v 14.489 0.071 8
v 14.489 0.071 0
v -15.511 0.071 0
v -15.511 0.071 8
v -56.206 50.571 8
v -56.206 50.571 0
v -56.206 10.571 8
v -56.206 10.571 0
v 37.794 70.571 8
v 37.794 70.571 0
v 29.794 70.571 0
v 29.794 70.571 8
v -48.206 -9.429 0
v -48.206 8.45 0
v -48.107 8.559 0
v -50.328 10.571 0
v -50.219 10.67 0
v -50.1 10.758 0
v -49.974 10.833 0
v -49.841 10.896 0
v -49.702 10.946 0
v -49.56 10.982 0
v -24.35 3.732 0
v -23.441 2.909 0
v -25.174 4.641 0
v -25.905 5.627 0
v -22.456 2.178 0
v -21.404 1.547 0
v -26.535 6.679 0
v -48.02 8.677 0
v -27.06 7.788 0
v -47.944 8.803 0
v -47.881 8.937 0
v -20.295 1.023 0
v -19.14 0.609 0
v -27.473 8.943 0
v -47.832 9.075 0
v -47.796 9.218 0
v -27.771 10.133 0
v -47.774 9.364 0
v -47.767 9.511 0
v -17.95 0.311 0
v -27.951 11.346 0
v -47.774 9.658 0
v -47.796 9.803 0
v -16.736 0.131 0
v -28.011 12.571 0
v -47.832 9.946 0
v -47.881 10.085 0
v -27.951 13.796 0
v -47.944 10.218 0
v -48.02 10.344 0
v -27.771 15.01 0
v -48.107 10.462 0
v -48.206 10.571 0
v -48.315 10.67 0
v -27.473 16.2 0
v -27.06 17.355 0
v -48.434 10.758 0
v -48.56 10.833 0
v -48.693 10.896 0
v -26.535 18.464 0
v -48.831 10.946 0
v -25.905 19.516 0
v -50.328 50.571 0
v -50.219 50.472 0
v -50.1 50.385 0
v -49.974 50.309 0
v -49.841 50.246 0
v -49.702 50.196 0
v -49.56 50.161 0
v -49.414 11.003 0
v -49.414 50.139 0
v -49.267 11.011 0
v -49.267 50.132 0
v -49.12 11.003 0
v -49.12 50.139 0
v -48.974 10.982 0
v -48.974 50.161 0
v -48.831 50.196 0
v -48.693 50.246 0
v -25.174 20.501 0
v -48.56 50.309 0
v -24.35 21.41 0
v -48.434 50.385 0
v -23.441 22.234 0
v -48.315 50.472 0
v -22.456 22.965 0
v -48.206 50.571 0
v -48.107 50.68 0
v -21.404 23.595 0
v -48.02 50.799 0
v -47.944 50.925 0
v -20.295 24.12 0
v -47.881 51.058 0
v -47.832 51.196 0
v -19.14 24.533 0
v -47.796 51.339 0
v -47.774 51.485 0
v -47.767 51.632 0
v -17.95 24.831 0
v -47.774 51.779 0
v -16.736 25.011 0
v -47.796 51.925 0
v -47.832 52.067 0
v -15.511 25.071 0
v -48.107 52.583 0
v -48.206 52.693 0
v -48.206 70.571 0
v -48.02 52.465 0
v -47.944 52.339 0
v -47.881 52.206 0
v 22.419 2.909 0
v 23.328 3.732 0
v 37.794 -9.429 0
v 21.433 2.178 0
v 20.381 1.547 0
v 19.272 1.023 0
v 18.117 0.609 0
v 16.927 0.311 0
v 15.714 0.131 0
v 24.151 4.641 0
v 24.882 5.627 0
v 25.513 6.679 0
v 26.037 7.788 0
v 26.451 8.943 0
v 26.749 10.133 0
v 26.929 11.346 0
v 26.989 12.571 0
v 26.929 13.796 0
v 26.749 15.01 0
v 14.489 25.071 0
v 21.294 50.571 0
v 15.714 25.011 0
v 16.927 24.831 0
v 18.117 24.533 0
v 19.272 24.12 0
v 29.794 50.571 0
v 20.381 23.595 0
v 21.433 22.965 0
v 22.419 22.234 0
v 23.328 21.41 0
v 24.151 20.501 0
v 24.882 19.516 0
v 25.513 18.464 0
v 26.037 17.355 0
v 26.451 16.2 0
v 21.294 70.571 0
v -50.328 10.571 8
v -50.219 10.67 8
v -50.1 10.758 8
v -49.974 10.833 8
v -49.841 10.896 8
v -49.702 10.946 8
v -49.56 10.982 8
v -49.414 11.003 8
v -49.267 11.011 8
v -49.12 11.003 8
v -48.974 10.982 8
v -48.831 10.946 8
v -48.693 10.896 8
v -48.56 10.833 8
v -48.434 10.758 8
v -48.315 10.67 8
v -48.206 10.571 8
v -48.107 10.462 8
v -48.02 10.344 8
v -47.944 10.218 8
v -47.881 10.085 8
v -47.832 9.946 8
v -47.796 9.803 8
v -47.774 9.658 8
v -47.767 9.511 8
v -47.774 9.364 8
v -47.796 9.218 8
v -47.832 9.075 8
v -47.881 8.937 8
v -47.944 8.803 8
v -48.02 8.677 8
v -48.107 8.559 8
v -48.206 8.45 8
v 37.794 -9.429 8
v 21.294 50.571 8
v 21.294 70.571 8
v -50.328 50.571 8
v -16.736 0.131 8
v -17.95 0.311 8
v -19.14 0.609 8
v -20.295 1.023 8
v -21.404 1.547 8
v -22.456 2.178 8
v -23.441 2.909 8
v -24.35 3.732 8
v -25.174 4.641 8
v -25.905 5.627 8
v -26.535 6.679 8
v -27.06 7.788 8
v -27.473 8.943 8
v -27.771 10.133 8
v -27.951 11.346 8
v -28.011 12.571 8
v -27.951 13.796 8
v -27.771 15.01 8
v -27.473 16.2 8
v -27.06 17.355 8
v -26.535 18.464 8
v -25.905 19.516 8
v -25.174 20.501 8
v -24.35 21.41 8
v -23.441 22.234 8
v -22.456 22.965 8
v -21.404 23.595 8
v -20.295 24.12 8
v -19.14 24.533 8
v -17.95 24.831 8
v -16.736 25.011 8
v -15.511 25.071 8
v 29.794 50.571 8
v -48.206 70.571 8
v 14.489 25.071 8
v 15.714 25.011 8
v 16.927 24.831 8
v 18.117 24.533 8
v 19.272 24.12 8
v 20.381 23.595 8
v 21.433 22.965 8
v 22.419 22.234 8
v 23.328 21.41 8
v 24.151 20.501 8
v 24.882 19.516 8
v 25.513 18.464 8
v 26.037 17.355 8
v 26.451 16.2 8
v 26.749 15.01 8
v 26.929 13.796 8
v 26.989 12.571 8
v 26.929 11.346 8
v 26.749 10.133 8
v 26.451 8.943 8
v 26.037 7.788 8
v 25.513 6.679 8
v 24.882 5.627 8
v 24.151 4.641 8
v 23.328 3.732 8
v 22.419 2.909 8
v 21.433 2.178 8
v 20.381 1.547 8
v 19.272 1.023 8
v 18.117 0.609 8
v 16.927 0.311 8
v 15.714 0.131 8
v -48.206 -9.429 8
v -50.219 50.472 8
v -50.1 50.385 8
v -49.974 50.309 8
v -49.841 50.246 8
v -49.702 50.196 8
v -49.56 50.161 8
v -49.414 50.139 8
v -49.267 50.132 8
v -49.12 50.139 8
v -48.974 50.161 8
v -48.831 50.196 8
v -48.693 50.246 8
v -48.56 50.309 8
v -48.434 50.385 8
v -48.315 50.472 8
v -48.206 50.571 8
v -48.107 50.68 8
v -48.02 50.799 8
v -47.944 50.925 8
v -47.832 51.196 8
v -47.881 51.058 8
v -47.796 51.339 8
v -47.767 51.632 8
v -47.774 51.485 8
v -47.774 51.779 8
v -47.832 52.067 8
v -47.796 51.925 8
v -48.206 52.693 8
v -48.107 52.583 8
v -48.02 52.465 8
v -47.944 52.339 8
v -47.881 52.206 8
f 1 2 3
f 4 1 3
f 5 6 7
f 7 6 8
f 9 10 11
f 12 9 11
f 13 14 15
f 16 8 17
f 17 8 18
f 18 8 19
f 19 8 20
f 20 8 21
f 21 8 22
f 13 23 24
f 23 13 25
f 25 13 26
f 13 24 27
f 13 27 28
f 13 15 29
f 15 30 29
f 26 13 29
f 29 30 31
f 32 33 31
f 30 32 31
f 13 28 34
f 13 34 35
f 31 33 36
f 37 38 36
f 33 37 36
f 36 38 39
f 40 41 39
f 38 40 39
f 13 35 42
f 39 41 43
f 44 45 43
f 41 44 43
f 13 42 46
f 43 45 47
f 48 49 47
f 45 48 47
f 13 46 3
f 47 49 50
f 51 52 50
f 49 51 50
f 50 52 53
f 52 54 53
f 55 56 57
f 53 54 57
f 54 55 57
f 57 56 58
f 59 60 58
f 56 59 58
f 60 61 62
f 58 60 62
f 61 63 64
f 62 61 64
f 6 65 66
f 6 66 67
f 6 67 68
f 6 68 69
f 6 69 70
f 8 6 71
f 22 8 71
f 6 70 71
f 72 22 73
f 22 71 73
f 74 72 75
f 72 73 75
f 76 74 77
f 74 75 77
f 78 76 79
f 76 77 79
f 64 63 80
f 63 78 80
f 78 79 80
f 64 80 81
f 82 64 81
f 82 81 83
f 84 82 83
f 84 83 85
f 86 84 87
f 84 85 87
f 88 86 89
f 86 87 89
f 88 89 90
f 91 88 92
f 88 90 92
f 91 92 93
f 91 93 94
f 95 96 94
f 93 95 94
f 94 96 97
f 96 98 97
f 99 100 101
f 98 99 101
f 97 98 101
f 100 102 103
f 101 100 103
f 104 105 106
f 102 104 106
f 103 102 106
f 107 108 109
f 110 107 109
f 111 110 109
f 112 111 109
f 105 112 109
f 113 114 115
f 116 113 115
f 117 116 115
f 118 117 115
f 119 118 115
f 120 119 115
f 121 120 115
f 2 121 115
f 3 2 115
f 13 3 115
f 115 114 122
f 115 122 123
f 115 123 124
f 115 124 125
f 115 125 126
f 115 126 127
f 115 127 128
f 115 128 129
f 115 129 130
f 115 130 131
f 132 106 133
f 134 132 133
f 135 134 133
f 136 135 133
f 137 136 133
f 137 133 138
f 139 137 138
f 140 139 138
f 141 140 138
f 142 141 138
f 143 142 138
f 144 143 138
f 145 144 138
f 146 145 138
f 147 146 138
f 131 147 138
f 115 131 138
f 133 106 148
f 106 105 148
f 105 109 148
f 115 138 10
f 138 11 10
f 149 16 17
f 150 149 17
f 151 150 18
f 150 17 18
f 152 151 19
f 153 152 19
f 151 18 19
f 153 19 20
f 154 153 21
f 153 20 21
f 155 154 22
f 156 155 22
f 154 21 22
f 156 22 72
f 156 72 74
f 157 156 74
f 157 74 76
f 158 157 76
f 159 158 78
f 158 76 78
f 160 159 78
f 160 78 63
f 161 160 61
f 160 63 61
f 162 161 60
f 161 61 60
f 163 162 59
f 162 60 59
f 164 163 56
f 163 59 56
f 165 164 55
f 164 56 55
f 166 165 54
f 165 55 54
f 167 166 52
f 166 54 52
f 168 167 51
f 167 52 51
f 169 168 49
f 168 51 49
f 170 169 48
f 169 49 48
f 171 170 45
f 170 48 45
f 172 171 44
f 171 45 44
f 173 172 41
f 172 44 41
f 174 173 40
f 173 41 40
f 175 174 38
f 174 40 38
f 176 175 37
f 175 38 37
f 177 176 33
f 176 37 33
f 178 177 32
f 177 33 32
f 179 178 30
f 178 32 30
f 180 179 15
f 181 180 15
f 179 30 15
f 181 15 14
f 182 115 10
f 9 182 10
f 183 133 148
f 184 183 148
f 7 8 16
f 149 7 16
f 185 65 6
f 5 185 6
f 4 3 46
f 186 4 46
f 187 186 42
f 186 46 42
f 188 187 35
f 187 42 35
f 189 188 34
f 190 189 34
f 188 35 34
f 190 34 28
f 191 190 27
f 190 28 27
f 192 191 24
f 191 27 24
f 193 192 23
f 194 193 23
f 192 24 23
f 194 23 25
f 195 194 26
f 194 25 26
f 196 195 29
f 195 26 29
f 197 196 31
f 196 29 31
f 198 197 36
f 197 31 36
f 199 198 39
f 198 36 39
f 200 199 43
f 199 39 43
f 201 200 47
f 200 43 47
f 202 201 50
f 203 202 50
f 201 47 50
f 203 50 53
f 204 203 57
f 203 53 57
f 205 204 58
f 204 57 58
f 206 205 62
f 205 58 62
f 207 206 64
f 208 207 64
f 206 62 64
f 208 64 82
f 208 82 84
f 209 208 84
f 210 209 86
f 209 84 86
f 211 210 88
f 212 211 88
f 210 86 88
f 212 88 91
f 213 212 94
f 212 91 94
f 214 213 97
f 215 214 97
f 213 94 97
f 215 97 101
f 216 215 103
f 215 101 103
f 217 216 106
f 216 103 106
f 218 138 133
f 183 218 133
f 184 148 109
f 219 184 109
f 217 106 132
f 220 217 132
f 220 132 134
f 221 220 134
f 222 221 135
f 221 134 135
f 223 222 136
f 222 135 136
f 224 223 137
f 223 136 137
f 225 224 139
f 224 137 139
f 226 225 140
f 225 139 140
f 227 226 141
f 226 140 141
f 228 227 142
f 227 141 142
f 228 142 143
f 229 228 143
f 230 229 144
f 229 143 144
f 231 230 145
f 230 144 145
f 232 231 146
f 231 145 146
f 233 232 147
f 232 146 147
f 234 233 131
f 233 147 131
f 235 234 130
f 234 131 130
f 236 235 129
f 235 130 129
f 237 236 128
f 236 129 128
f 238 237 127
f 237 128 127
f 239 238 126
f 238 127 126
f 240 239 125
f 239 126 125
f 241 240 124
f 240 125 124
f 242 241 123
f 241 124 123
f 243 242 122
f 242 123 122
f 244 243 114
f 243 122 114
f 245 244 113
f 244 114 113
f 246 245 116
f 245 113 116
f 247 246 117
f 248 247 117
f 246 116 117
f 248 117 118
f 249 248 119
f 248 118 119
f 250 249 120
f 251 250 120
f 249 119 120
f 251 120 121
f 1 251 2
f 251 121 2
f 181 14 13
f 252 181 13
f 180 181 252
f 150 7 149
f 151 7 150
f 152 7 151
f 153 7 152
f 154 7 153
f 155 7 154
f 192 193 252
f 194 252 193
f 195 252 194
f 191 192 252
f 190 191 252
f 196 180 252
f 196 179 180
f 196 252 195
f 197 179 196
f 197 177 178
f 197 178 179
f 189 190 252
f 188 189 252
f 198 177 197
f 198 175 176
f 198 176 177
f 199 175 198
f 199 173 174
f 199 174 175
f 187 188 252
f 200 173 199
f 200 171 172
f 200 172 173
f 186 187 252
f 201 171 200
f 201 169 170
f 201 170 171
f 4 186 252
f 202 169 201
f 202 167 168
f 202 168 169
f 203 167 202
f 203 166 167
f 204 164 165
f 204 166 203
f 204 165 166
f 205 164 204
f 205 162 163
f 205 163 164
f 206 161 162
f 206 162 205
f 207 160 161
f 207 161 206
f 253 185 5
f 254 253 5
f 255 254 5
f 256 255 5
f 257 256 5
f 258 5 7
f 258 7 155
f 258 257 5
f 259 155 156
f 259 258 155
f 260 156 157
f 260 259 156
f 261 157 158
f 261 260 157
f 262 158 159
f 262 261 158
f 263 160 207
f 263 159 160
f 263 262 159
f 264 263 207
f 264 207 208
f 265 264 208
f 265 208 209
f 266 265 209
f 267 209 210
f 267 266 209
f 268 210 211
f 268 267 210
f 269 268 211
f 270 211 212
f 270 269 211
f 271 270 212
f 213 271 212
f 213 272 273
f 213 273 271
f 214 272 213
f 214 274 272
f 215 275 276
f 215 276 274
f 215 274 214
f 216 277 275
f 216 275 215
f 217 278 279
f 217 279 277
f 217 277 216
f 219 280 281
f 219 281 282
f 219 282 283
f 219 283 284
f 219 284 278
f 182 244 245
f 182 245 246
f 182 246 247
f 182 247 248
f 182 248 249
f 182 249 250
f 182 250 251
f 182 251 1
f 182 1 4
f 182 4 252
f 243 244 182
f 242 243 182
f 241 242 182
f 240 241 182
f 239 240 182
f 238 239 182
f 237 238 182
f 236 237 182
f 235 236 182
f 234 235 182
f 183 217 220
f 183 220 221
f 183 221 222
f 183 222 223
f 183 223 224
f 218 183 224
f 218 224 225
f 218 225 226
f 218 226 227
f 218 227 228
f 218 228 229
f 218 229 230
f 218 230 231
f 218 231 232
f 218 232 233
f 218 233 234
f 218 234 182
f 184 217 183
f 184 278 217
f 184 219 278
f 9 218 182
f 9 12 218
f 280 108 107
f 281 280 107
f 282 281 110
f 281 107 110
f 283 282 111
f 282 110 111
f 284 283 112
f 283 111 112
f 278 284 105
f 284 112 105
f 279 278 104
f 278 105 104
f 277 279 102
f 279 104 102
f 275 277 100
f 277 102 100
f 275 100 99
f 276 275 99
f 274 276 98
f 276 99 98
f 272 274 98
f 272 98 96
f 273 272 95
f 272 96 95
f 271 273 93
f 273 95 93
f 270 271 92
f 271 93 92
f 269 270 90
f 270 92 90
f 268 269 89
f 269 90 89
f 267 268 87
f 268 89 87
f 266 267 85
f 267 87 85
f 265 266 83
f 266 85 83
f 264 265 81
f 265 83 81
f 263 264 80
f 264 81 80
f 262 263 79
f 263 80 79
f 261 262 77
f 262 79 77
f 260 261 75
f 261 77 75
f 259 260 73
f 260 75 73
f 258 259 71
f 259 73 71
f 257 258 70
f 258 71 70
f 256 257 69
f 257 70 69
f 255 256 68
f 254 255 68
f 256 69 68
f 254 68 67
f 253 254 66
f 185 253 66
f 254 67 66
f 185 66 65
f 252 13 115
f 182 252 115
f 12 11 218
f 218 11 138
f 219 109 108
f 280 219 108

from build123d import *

# Parameters (mm, degrees)
BOSS_EXTRU_1_DEPTH = 8


with BuildPart() as part:
    # Esquisse1 → Boss.-Extru.1 (new body)
    with BuildSketch(Plane.XY):
        with BuildLine():
            Line((-48.206262386, 70.57122428), (-48.206262386, 52.692544623))
            ThreePointArc((-48.206262386, 52.692544623), (-48.206262386, 50.57122428), (-50.327582729, 50.57122428))
            Line((-50.327582729, 50.57122428), (-56.206262386, 50.57122428))
            Line((-56.206262386, 50.57122428), (-56.206262386, 10.57122428))
            Line((-56.206262386, 10.57122428), (-50.327582729, 10.57122428))
            ThreePointArc((-50.327582729, 10.57122428), (-48.206262386, 10.57122428), (-48.206262386, 8.449903936))
            Line((-48.206262386, 8.449903936), (-48.206262386, -9.42877572))
            Line((-48.206262386, -9.42877572), (37.793737614, -9.42877572))
            Line((37.793737614, -9.42877572), (37.793737614, 70.57122428))
            Line((37.793737614, 70.57122428), (29.793737614, 70.57122428))
            Line((29.793737614, 70.57122428), (29.793737614, 50.57122428))
            Line((29.793737614, 50.57122428), (21.293737614, 50.57122428))
            Line((21.293737614, 50.57122428), (21.293737614, 70.57122428))
            Line((21.293737614, 70.57122428), (-48.206262386, 70.57122428))
        make_face()
        with BuildLine():
            Line((-15.511163156, 25.07122428), (14.488836844, 25.07122428))
            ThreePointArc((14.488836844, 25.07122428), (26.988836844, 12.57122428), (14.488836844, 0.07122428))
            Line((14.488836844, 0.07122428), (-15.511163156, 0.07122428))
            ThreePointArc((-15.511163156, 0.07122428), (-28.011163156, 12.57122428), (-15.511163156, 25.07122428))
        make_face(mode=Mode.SUBTRACT)
    extrude(amount=BOSS_EXTRU_1_DEPTH)


solid = part.part
